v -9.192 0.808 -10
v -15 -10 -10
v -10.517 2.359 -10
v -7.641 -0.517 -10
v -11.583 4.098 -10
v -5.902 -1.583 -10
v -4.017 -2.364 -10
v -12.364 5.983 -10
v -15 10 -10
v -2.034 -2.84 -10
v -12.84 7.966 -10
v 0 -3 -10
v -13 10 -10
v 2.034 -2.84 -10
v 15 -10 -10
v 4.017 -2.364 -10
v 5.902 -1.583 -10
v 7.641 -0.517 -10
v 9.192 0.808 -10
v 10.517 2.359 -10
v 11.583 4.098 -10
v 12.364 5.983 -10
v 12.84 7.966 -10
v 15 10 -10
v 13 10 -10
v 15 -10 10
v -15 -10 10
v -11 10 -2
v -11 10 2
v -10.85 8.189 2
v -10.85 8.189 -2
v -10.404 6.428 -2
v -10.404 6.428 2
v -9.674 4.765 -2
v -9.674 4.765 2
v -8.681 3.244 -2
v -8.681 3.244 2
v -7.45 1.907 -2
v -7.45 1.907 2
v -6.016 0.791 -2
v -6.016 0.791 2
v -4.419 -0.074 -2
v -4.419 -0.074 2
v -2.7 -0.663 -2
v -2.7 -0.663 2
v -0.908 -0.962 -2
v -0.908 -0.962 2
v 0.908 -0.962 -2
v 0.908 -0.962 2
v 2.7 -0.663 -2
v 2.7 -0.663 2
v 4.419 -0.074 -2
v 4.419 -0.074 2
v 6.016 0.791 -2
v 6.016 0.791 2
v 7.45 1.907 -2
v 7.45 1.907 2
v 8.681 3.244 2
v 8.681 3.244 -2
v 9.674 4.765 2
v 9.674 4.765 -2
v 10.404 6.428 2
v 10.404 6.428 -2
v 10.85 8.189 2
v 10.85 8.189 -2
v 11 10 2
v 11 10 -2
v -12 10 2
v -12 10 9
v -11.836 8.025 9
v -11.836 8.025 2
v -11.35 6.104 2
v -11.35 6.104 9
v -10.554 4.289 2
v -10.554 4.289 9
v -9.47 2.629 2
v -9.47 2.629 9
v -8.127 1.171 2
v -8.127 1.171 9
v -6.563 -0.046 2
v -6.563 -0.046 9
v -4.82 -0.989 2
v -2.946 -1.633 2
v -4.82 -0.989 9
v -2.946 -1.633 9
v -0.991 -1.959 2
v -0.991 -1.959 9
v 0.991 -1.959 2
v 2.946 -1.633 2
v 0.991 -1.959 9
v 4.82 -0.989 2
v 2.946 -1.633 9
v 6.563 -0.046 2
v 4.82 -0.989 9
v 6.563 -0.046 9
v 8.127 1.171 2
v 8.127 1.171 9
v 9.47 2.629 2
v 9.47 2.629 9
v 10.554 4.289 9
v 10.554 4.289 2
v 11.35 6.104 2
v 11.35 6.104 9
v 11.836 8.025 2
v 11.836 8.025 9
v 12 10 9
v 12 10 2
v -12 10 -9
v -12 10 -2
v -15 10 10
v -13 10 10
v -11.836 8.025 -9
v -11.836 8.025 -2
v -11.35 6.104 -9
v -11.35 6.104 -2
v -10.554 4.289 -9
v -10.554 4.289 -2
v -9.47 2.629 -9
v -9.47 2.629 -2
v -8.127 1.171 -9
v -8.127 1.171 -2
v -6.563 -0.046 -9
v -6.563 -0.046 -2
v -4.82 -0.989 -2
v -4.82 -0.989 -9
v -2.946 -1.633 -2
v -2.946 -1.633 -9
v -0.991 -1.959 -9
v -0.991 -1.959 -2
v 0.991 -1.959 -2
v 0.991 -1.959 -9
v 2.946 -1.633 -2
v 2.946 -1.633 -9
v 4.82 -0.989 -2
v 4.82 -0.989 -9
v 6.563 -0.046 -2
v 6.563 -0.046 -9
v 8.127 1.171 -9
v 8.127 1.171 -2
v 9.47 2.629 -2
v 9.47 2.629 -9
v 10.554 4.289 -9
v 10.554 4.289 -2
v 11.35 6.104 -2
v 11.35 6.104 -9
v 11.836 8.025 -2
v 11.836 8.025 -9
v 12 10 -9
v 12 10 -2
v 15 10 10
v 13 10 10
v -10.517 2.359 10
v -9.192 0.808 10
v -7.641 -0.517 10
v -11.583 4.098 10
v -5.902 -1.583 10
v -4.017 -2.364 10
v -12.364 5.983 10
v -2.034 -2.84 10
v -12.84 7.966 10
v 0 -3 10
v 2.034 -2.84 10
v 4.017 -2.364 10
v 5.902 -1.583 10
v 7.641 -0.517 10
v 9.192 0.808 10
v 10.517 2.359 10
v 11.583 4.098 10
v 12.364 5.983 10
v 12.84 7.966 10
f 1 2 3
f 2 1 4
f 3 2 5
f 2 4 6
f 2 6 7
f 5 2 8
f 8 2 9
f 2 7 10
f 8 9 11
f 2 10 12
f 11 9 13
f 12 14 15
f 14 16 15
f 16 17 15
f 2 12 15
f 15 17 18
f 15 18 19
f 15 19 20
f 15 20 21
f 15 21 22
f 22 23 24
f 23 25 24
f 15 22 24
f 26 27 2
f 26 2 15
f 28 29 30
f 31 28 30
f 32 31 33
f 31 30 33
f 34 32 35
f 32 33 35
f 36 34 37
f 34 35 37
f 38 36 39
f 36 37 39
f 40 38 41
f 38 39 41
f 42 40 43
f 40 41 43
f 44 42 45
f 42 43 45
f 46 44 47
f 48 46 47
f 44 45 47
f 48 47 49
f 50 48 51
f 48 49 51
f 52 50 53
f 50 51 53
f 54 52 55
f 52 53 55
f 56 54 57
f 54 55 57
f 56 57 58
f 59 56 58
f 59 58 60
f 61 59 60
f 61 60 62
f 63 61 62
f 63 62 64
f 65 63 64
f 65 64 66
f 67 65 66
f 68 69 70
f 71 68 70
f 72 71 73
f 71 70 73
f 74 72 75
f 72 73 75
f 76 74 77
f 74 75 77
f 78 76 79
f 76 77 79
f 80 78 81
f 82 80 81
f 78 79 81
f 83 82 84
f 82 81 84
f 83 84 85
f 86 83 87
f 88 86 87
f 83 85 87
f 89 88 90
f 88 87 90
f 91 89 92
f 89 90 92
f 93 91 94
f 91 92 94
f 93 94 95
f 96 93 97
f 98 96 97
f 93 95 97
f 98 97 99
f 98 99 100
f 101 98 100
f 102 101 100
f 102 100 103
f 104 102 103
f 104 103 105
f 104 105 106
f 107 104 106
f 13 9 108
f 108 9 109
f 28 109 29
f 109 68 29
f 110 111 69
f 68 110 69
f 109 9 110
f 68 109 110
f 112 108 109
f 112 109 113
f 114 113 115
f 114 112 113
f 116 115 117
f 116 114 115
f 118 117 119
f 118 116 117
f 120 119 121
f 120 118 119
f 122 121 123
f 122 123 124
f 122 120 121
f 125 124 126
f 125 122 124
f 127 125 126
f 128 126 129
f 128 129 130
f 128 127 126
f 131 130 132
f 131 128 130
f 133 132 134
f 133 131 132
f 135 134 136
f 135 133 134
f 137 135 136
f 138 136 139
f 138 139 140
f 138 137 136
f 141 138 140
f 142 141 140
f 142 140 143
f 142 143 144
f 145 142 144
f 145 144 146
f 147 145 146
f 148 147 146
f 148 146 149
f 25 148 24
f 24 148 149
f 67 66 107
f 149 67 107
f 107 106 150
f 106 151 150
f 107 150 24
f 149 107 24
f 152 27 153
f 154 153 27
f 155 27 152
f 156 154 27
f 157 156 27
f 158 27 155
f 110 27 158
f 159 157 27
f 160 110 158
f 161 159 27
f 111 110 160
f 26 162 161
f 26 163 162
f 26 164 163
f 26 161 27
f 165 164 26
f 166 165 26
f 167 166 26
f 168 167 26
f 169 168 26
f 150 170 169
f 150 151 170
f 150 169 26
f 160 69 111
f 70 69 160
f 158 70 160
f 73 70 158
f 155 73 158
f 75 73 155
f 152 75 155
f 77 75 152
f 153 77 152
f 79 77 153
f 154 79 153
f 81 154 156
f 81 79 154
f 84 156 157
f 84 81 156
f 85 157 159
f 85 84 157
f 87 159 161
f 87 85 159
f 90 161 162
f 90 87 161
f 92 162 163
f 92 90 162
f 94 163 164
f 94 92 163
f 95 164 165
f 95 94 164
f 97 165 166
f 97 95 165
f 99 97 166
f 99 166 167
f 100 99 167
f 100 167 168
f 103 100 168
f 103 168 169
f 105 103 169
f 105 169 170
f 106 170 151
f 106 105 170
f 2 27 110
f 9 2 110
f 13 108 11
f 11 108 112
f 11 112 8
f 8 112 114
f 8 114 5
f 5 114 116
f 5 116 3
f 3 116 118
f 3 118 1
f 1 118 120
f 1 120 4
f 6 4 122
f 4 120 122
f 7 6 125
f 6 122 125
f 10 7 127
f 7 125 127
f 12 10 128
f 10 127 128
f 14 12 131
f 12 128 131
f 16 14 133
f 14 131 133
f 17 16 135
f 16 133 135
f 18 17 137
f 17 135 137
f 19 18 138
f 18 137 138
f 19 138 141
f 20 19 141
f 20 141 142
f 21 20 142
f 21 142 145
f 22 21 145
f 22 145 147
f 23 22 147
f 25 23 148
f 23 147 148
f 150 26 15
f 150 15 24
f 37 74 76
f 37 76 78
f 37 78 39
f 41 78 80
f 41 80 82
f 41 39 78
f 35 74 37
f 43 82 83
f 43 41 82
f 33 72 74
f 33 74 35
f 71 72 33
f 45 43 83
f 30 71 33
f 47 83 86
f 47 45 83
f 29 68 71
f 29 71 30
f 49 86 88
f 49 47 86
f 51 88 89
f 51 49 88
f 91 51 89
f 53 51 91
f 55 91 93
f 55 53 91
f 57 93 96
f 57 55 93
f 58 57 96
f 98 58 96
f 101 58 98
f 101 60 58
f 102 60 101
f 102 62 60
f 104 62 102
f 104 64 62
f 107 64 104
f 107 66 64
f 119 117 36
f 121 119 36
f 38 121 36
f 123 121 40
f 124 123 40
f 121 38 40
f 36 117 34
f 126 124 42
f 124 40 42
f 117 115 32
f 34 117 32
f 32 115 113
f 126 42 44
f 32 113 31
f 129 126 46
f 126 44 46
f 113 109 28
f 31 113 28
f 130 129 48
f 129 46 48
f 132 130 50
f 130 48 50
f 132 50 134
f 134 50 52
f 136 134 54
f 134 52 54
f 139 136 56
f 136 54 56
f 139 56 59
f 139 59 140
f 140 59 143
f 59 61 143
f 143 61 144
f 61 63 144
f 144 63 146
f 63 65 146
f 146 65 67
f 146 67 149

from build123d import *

# Parameters (mm, degrees)
SKETCH_1_W          = 30
SKETCH_1_H          = 20
EXTRUDE_1_DEPTH     = 10
SKETCH_2_R          = 12
CUT_EXTRUDE_1_DEPTH = 8
SKETCH_3_R          = 11
CUT_EXTRUDE_2_DEPTH = 10
CHAMFER_1_SIZE      = 1


with BuildPart() as part:
    # 스케치1 → 보스-돌출1 (new, symmetric)
    with BuildSketch(Plane.XY):
        Rectangle(SKETCH_1_W, SKETCH_1_H)
    extrude(amount=EXTRUDE_1_DEPTH, both=True)

    # 스케치2 → 컷-돌출1 (cut)
    with BuildSketch(Plane.XY.offset(10)):
        with Locations((0, 10)):
            Circle(SKETCH_2_R)
    cut_extrude_1 = extrude(amount=-CUT_EXTRUDE_1_DEPTH, mode=Mode.SUBTRACT)

    # 대칭 복사1: 컷-돌출1 across plane
    add(cut_extrude_1.mirror(Plane.XY), mode=Mode.SUBTRACT)

    # 스케치3 → 컷-돌출2 (cut)
    with BuildSketch(Plane.XY.offset(2)):
        with Locations((0, 10)):
            Circle(SKETCH_3_R)
    extrude(amount=-CUT_EXTRUDE_2_DEPTH, mode=Mode.SUBTRACT)

    # 모따기1
    chamfer_1_edges = [part.edges().sort_by_distance(p)[0] for p in [
        (0, -2, 10),
        (0, -2, -10),
    ]]
    chamfer(chamfer_1_edges, length=CHAMFER_1_SIZE)


solid = part.part
